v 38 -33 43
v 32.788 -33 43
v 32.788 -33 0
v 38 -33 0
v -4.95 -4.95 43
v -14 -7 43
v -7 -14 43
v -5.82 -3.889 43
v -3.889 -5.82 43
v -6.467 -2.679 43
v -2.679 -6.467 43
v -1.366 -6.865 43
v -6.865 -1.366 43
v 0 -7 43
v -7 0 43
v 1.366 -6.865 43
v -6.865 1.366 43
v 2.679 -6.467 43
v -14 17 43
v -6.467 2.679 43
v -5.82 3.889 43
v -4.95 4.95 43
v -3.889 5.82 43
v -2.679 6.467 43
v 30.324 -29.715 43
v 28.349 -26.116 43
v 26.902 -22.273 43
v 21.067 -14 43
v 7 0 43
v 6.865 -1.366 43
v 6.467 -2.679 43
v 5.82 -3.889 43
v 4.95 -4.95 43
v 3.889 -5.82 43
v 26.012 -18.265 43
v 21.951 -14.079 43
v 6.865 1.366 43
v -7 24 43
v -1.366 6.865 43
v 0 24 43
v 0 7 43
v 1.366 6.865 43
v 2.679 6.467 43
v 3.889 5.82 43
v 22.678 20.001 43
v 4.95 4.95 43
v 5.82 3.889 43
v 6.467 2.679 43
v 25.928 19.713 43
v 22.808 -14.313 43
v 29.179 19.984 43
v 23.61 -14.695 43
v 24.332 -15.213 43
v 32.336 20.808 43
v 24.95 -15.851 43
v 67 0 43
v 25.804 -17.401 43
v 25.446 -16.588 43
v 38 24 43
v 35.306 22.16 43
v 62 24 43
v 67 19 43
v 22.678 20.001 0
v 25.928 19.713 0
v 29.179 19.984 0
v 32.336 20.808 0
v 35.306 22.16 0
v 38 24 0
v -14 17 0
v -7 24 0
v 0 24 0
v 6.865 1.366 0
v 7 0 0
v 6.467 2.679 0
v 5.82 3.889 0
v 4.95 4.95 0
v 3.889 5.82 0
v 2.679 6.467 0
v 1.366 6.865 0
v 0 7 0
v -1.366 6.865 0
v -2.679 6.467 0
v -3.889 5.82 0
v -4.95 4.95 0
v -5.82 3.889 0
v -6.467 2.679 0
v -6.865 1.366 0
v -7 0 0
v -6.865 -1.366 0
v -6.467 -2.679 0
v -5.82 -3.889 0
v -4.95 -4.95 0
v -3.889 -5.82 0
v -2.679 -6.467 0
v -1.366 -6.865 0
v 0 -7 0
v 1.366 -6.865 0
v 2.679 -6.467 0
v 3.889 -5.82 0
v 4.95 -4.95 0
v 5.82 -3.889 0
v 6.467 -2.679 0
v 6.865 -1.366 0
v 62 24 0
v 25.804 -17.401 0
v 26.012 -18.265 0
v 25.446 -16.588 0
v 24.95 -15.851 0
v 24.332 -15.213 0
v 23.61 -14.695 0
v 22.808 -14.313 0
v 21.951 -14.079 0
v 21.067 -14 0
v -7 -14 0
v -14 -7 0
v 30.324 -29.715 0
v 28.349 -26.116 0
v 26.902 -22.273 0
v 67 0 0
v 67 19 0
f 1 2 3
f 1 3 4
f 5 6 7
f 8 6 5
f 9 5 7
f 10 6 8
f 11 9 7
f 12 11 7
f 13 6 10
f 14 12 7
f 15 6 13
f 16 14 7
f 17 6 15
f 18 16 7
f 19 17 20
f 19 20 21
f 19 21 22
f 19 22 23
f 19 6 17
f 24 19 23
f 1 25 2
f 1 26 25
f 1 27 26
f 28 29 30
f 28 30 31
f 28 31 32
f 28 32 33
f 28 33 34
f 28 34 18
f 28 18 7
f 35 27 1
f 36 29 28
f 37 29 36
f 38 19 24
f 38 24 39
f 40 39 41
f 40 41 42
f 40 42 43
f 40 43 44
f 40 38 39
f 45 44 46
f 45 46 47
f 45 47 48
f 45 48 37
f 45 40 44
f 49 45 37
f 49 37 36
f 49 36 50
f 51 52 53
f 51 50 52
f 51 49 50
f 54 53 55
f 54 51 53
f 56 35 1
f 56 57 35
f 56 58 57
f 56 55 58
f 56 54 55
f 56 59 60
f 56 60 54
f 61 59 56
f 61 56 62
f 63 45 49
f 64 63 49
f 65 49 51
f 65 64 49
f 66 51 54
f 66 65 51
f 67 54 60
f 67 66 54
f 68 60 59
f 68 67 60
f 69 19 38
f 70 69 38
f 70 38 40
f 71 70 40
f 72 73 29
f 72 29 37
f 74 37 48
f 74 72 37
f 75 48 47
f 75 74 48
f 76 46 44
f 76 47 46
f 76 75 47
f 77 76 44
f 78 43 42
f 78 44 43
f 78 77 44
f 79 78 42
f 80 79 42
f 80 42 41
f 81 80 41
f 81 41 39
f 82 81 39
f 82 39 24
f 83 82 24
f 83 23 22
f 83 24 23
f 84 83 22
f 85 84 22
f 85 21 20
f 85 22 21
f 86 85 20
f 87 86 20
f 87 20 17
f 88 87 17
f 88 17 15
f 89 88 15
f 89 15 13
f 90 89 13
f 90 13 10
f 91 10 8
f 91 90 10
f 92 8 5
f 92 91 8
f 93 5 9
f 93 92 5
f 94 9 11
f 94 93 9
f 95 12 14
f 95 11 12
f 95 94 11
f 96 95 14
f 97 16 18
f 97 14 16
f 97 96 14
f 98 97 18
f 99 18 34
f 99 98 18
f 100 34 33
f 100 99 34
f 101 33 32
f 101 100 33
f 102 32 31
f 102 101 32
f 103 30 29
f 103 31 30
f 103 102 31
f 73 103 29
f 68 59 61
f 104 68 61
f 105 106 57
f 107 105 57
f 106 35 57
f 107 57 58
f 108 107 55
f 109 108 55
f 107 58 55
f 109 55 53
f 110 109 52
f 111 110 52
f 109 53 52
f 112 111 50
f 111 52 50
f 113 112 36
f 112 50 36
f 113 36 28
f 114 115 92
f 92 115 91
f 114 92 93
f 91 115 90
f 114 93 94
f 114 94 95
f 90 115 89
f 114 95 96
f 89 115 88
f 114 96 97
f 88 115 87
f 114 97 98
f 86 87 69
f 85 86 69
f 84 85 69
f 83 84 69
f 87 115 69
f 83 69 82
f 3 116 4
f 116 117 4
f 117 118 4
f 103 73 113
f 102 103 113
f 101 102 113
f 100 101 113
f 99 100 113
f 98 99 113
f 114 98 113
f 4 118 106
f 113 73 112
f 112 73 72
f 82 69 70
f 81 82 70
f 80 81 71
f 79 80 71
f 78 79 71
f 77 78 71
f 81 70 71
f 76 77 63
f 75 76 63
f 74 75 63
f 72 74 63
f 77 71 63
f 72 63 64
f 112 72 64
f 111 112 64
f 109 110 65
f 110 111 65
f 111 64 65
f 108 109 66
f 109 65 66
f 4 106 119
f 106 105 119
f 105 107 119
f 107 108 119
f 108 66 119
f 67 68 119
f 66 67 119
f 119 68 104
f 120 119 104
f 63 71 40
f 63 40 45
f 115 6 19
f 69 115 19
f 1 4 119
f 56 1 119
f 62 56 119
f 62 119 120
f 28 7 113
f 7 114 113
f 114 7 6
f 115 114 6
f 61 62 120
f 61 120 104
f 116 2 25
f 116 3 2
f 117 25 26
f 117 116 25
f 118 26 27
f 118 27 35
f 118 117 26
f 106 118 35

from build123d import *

# Parameters (mm, degrees)
SKETCH1_W               = 81
SKETCH1_H               = 57
BOSS_EXTRUDE1_DEPTH     = 43
CUT_EXTRUDE1_DEPTH      = 87.180044094
CUT_EXTRUDE1_DEPTH_BACK = 87.180044094
CUT_EXTRUDE2_DEPTH      = 87.180044094
CUT_EXTRUDE2_DEPTH_BACK = 87.180044094
SKETCH3_W               = 56.062487614
SKETCH3_H               = 49.157310494
CUT_EXTRUDE4_DEPTH      = 87.180044094
CUT_EXTRUDE4_DEPTH_BACK = 87.180044094
SKETCH4_R               = 7
FILLET1_R               = 5
CUT_EXTRUDE5_DEPTH      = 87.180044094
CUT_EXTRUDE5_DEPTH_BACK = 87.180044094
CUT_EXTRUDE7_DEPTH      = 87.180044094
CUT_EXTRUDE7_DEPTH_BACK = 87.180044094
SKETCH6_R               = 19
CUT_EXTRUDE8_DEPTH      = 87.180044094
CUT_EXTRUDE8_DEPTH_BACK = 87.180044094


with BuildPart() as part:
    # Sketch1 → Boss-Extrude1 (new body)
    with BuildSketch(Plane.XY):
        with Locations((26.5, -4.5)):
            Rectangle(SKETCH1_W, SKETCH1_H)
    extrude(amount=BOSS_EXTRUDE1_DEPTH)

    # Sketch2 → Cut-Extrude1 (cut, two sides: drawn at the far end of the back side and taken through both)
    with BuildSketch(Plane.XY.offset(-CUT_EXTRUDE1_DEPTH_BACK)):
        Polygon((38, -33), (67, 0), (92.563073461, 0), (92.563073461, -46.247191662), (38, -46.247191662), align=None)
    extrude(amount=CUT_EXTRUDE1_DEPTH + CUT_EXTRUDE1_DEPTH_BACK, mode=Mode.SUBTRACT)

    # Sketch3 → Cut-Extrude2 (cut, two sides: drawn at the far end of the back side and taken through both)
    with BuildSketch(Plane.XY.offset(-CUT_EXTRUDE2_DEPTH_BACK)):
        Polygon((67, 19), (62, 24), (62, 35.07400688), (76.394076925, 35.07400688), (76.394076925, 19), align=None)
        with Locations((-2.33427411, -38.578655247)):
            Rectangle(SKETCH3_W, SKETCH3_H)
    extrude(amount=CUT_EXTRUDE2_DEPTH + CUT_EXTRUDE2_DEPTH_BACK, mode=Mode.SUBTRACT)

    # Sketch4 → Cut-Extrude4 (cut, two sides: drawn at the far end of the back side and taken through both)
    with BuildSketch(Plane.XY.offset(-CUT_EXTRUDE4_DEPTH_BACK)):
        Circle(SKETCH4_R)
        Polygon((-14, -7), (-7, -14), (-7, -25.581490966), (-25.698807285, -25.581490966), (-25.698807285, 4.698807285), align=None)
        with BuildLine():
            Line((25.696969697, -14), (1.830031376, -60.145765031))
            Line((1.830031376, -60.145765031), (54.696969697, -43))
            ThreePointArc((54.696969697, -43), (34.190873043, -34.506096654), (25.696969697, -14))
        make_face()
    extrude(amount=CUT_EXTRUDE4_DEPTH + CUT_EXTRUDE4_DEPTH_BACK, mode=Mode.SUBTRACT)

    # Fillet1
    fillet1_edges = [part.edges().sort_by_distance(p)[0] for p in [
        (25.696969697, -14, 21.5),
    ]]
    fillet(fillet1_edges, radius=FILLET1_R)

    # Sketch5 → Cut-Extrude5 (cut, two sides: drawn at the far end of the back side and taken through both)
    with BuildSketch(Plane.XY.offset(-CUT_EXTRUDE5_DEPTH_BACK)):
        Polygon((-14, 17), (-7, 24), (-7, 33.910955106), (-24.773301804, 33.910955106), (-24.773301804, 17), align=None)
    extrude(amount=CUT_EXTRUDE5_DEPTH + CUT_EXTRUDE5_DEPTH_BACK, mode=Mode.SUBTRACT)

    # Sketch6 → Cut-Extrude7 (cut, two sides: drawn at the far end of the back side and taken through both)
    with BuildSketch(Plane.XY.offset(-CUT_EXTRUDE7_DEPTH_BACK)):
        with Locations((25.977509097, 38.71256988)):
            Circle(SKETCH6_R)
    extrude(amount=CUT_EXTRUDE7_DEPTH + CUT_EXTRUDE7_DEPTH_BACK, mode=Mode.SUBTRACT)

    # Sketch7 → Cut-Extrude8 (cut, two sides: drawn at the far end of the back side and taken through both)
    with BuildSketch(Plane.XY.offset(-CUT_EXTRUDE8_DEPTH_BACK)):
        with BuildLine():
            Line((13.955018194, 24), (0, 24))
            Line((0, 24), (22.678193721, 20.001222573))
            ThreePointArc((22.678193721, 20.001222573), (18.059997358, 21.440829729), (13.955018194, 24))
        make_face()
    extrude(amount=CUT_EXTRUDE8_DEPTH + CUT_EXTRUDE8_DEPTH_BACK, mode=Mode.SUBTRACT)


solid = part.part
